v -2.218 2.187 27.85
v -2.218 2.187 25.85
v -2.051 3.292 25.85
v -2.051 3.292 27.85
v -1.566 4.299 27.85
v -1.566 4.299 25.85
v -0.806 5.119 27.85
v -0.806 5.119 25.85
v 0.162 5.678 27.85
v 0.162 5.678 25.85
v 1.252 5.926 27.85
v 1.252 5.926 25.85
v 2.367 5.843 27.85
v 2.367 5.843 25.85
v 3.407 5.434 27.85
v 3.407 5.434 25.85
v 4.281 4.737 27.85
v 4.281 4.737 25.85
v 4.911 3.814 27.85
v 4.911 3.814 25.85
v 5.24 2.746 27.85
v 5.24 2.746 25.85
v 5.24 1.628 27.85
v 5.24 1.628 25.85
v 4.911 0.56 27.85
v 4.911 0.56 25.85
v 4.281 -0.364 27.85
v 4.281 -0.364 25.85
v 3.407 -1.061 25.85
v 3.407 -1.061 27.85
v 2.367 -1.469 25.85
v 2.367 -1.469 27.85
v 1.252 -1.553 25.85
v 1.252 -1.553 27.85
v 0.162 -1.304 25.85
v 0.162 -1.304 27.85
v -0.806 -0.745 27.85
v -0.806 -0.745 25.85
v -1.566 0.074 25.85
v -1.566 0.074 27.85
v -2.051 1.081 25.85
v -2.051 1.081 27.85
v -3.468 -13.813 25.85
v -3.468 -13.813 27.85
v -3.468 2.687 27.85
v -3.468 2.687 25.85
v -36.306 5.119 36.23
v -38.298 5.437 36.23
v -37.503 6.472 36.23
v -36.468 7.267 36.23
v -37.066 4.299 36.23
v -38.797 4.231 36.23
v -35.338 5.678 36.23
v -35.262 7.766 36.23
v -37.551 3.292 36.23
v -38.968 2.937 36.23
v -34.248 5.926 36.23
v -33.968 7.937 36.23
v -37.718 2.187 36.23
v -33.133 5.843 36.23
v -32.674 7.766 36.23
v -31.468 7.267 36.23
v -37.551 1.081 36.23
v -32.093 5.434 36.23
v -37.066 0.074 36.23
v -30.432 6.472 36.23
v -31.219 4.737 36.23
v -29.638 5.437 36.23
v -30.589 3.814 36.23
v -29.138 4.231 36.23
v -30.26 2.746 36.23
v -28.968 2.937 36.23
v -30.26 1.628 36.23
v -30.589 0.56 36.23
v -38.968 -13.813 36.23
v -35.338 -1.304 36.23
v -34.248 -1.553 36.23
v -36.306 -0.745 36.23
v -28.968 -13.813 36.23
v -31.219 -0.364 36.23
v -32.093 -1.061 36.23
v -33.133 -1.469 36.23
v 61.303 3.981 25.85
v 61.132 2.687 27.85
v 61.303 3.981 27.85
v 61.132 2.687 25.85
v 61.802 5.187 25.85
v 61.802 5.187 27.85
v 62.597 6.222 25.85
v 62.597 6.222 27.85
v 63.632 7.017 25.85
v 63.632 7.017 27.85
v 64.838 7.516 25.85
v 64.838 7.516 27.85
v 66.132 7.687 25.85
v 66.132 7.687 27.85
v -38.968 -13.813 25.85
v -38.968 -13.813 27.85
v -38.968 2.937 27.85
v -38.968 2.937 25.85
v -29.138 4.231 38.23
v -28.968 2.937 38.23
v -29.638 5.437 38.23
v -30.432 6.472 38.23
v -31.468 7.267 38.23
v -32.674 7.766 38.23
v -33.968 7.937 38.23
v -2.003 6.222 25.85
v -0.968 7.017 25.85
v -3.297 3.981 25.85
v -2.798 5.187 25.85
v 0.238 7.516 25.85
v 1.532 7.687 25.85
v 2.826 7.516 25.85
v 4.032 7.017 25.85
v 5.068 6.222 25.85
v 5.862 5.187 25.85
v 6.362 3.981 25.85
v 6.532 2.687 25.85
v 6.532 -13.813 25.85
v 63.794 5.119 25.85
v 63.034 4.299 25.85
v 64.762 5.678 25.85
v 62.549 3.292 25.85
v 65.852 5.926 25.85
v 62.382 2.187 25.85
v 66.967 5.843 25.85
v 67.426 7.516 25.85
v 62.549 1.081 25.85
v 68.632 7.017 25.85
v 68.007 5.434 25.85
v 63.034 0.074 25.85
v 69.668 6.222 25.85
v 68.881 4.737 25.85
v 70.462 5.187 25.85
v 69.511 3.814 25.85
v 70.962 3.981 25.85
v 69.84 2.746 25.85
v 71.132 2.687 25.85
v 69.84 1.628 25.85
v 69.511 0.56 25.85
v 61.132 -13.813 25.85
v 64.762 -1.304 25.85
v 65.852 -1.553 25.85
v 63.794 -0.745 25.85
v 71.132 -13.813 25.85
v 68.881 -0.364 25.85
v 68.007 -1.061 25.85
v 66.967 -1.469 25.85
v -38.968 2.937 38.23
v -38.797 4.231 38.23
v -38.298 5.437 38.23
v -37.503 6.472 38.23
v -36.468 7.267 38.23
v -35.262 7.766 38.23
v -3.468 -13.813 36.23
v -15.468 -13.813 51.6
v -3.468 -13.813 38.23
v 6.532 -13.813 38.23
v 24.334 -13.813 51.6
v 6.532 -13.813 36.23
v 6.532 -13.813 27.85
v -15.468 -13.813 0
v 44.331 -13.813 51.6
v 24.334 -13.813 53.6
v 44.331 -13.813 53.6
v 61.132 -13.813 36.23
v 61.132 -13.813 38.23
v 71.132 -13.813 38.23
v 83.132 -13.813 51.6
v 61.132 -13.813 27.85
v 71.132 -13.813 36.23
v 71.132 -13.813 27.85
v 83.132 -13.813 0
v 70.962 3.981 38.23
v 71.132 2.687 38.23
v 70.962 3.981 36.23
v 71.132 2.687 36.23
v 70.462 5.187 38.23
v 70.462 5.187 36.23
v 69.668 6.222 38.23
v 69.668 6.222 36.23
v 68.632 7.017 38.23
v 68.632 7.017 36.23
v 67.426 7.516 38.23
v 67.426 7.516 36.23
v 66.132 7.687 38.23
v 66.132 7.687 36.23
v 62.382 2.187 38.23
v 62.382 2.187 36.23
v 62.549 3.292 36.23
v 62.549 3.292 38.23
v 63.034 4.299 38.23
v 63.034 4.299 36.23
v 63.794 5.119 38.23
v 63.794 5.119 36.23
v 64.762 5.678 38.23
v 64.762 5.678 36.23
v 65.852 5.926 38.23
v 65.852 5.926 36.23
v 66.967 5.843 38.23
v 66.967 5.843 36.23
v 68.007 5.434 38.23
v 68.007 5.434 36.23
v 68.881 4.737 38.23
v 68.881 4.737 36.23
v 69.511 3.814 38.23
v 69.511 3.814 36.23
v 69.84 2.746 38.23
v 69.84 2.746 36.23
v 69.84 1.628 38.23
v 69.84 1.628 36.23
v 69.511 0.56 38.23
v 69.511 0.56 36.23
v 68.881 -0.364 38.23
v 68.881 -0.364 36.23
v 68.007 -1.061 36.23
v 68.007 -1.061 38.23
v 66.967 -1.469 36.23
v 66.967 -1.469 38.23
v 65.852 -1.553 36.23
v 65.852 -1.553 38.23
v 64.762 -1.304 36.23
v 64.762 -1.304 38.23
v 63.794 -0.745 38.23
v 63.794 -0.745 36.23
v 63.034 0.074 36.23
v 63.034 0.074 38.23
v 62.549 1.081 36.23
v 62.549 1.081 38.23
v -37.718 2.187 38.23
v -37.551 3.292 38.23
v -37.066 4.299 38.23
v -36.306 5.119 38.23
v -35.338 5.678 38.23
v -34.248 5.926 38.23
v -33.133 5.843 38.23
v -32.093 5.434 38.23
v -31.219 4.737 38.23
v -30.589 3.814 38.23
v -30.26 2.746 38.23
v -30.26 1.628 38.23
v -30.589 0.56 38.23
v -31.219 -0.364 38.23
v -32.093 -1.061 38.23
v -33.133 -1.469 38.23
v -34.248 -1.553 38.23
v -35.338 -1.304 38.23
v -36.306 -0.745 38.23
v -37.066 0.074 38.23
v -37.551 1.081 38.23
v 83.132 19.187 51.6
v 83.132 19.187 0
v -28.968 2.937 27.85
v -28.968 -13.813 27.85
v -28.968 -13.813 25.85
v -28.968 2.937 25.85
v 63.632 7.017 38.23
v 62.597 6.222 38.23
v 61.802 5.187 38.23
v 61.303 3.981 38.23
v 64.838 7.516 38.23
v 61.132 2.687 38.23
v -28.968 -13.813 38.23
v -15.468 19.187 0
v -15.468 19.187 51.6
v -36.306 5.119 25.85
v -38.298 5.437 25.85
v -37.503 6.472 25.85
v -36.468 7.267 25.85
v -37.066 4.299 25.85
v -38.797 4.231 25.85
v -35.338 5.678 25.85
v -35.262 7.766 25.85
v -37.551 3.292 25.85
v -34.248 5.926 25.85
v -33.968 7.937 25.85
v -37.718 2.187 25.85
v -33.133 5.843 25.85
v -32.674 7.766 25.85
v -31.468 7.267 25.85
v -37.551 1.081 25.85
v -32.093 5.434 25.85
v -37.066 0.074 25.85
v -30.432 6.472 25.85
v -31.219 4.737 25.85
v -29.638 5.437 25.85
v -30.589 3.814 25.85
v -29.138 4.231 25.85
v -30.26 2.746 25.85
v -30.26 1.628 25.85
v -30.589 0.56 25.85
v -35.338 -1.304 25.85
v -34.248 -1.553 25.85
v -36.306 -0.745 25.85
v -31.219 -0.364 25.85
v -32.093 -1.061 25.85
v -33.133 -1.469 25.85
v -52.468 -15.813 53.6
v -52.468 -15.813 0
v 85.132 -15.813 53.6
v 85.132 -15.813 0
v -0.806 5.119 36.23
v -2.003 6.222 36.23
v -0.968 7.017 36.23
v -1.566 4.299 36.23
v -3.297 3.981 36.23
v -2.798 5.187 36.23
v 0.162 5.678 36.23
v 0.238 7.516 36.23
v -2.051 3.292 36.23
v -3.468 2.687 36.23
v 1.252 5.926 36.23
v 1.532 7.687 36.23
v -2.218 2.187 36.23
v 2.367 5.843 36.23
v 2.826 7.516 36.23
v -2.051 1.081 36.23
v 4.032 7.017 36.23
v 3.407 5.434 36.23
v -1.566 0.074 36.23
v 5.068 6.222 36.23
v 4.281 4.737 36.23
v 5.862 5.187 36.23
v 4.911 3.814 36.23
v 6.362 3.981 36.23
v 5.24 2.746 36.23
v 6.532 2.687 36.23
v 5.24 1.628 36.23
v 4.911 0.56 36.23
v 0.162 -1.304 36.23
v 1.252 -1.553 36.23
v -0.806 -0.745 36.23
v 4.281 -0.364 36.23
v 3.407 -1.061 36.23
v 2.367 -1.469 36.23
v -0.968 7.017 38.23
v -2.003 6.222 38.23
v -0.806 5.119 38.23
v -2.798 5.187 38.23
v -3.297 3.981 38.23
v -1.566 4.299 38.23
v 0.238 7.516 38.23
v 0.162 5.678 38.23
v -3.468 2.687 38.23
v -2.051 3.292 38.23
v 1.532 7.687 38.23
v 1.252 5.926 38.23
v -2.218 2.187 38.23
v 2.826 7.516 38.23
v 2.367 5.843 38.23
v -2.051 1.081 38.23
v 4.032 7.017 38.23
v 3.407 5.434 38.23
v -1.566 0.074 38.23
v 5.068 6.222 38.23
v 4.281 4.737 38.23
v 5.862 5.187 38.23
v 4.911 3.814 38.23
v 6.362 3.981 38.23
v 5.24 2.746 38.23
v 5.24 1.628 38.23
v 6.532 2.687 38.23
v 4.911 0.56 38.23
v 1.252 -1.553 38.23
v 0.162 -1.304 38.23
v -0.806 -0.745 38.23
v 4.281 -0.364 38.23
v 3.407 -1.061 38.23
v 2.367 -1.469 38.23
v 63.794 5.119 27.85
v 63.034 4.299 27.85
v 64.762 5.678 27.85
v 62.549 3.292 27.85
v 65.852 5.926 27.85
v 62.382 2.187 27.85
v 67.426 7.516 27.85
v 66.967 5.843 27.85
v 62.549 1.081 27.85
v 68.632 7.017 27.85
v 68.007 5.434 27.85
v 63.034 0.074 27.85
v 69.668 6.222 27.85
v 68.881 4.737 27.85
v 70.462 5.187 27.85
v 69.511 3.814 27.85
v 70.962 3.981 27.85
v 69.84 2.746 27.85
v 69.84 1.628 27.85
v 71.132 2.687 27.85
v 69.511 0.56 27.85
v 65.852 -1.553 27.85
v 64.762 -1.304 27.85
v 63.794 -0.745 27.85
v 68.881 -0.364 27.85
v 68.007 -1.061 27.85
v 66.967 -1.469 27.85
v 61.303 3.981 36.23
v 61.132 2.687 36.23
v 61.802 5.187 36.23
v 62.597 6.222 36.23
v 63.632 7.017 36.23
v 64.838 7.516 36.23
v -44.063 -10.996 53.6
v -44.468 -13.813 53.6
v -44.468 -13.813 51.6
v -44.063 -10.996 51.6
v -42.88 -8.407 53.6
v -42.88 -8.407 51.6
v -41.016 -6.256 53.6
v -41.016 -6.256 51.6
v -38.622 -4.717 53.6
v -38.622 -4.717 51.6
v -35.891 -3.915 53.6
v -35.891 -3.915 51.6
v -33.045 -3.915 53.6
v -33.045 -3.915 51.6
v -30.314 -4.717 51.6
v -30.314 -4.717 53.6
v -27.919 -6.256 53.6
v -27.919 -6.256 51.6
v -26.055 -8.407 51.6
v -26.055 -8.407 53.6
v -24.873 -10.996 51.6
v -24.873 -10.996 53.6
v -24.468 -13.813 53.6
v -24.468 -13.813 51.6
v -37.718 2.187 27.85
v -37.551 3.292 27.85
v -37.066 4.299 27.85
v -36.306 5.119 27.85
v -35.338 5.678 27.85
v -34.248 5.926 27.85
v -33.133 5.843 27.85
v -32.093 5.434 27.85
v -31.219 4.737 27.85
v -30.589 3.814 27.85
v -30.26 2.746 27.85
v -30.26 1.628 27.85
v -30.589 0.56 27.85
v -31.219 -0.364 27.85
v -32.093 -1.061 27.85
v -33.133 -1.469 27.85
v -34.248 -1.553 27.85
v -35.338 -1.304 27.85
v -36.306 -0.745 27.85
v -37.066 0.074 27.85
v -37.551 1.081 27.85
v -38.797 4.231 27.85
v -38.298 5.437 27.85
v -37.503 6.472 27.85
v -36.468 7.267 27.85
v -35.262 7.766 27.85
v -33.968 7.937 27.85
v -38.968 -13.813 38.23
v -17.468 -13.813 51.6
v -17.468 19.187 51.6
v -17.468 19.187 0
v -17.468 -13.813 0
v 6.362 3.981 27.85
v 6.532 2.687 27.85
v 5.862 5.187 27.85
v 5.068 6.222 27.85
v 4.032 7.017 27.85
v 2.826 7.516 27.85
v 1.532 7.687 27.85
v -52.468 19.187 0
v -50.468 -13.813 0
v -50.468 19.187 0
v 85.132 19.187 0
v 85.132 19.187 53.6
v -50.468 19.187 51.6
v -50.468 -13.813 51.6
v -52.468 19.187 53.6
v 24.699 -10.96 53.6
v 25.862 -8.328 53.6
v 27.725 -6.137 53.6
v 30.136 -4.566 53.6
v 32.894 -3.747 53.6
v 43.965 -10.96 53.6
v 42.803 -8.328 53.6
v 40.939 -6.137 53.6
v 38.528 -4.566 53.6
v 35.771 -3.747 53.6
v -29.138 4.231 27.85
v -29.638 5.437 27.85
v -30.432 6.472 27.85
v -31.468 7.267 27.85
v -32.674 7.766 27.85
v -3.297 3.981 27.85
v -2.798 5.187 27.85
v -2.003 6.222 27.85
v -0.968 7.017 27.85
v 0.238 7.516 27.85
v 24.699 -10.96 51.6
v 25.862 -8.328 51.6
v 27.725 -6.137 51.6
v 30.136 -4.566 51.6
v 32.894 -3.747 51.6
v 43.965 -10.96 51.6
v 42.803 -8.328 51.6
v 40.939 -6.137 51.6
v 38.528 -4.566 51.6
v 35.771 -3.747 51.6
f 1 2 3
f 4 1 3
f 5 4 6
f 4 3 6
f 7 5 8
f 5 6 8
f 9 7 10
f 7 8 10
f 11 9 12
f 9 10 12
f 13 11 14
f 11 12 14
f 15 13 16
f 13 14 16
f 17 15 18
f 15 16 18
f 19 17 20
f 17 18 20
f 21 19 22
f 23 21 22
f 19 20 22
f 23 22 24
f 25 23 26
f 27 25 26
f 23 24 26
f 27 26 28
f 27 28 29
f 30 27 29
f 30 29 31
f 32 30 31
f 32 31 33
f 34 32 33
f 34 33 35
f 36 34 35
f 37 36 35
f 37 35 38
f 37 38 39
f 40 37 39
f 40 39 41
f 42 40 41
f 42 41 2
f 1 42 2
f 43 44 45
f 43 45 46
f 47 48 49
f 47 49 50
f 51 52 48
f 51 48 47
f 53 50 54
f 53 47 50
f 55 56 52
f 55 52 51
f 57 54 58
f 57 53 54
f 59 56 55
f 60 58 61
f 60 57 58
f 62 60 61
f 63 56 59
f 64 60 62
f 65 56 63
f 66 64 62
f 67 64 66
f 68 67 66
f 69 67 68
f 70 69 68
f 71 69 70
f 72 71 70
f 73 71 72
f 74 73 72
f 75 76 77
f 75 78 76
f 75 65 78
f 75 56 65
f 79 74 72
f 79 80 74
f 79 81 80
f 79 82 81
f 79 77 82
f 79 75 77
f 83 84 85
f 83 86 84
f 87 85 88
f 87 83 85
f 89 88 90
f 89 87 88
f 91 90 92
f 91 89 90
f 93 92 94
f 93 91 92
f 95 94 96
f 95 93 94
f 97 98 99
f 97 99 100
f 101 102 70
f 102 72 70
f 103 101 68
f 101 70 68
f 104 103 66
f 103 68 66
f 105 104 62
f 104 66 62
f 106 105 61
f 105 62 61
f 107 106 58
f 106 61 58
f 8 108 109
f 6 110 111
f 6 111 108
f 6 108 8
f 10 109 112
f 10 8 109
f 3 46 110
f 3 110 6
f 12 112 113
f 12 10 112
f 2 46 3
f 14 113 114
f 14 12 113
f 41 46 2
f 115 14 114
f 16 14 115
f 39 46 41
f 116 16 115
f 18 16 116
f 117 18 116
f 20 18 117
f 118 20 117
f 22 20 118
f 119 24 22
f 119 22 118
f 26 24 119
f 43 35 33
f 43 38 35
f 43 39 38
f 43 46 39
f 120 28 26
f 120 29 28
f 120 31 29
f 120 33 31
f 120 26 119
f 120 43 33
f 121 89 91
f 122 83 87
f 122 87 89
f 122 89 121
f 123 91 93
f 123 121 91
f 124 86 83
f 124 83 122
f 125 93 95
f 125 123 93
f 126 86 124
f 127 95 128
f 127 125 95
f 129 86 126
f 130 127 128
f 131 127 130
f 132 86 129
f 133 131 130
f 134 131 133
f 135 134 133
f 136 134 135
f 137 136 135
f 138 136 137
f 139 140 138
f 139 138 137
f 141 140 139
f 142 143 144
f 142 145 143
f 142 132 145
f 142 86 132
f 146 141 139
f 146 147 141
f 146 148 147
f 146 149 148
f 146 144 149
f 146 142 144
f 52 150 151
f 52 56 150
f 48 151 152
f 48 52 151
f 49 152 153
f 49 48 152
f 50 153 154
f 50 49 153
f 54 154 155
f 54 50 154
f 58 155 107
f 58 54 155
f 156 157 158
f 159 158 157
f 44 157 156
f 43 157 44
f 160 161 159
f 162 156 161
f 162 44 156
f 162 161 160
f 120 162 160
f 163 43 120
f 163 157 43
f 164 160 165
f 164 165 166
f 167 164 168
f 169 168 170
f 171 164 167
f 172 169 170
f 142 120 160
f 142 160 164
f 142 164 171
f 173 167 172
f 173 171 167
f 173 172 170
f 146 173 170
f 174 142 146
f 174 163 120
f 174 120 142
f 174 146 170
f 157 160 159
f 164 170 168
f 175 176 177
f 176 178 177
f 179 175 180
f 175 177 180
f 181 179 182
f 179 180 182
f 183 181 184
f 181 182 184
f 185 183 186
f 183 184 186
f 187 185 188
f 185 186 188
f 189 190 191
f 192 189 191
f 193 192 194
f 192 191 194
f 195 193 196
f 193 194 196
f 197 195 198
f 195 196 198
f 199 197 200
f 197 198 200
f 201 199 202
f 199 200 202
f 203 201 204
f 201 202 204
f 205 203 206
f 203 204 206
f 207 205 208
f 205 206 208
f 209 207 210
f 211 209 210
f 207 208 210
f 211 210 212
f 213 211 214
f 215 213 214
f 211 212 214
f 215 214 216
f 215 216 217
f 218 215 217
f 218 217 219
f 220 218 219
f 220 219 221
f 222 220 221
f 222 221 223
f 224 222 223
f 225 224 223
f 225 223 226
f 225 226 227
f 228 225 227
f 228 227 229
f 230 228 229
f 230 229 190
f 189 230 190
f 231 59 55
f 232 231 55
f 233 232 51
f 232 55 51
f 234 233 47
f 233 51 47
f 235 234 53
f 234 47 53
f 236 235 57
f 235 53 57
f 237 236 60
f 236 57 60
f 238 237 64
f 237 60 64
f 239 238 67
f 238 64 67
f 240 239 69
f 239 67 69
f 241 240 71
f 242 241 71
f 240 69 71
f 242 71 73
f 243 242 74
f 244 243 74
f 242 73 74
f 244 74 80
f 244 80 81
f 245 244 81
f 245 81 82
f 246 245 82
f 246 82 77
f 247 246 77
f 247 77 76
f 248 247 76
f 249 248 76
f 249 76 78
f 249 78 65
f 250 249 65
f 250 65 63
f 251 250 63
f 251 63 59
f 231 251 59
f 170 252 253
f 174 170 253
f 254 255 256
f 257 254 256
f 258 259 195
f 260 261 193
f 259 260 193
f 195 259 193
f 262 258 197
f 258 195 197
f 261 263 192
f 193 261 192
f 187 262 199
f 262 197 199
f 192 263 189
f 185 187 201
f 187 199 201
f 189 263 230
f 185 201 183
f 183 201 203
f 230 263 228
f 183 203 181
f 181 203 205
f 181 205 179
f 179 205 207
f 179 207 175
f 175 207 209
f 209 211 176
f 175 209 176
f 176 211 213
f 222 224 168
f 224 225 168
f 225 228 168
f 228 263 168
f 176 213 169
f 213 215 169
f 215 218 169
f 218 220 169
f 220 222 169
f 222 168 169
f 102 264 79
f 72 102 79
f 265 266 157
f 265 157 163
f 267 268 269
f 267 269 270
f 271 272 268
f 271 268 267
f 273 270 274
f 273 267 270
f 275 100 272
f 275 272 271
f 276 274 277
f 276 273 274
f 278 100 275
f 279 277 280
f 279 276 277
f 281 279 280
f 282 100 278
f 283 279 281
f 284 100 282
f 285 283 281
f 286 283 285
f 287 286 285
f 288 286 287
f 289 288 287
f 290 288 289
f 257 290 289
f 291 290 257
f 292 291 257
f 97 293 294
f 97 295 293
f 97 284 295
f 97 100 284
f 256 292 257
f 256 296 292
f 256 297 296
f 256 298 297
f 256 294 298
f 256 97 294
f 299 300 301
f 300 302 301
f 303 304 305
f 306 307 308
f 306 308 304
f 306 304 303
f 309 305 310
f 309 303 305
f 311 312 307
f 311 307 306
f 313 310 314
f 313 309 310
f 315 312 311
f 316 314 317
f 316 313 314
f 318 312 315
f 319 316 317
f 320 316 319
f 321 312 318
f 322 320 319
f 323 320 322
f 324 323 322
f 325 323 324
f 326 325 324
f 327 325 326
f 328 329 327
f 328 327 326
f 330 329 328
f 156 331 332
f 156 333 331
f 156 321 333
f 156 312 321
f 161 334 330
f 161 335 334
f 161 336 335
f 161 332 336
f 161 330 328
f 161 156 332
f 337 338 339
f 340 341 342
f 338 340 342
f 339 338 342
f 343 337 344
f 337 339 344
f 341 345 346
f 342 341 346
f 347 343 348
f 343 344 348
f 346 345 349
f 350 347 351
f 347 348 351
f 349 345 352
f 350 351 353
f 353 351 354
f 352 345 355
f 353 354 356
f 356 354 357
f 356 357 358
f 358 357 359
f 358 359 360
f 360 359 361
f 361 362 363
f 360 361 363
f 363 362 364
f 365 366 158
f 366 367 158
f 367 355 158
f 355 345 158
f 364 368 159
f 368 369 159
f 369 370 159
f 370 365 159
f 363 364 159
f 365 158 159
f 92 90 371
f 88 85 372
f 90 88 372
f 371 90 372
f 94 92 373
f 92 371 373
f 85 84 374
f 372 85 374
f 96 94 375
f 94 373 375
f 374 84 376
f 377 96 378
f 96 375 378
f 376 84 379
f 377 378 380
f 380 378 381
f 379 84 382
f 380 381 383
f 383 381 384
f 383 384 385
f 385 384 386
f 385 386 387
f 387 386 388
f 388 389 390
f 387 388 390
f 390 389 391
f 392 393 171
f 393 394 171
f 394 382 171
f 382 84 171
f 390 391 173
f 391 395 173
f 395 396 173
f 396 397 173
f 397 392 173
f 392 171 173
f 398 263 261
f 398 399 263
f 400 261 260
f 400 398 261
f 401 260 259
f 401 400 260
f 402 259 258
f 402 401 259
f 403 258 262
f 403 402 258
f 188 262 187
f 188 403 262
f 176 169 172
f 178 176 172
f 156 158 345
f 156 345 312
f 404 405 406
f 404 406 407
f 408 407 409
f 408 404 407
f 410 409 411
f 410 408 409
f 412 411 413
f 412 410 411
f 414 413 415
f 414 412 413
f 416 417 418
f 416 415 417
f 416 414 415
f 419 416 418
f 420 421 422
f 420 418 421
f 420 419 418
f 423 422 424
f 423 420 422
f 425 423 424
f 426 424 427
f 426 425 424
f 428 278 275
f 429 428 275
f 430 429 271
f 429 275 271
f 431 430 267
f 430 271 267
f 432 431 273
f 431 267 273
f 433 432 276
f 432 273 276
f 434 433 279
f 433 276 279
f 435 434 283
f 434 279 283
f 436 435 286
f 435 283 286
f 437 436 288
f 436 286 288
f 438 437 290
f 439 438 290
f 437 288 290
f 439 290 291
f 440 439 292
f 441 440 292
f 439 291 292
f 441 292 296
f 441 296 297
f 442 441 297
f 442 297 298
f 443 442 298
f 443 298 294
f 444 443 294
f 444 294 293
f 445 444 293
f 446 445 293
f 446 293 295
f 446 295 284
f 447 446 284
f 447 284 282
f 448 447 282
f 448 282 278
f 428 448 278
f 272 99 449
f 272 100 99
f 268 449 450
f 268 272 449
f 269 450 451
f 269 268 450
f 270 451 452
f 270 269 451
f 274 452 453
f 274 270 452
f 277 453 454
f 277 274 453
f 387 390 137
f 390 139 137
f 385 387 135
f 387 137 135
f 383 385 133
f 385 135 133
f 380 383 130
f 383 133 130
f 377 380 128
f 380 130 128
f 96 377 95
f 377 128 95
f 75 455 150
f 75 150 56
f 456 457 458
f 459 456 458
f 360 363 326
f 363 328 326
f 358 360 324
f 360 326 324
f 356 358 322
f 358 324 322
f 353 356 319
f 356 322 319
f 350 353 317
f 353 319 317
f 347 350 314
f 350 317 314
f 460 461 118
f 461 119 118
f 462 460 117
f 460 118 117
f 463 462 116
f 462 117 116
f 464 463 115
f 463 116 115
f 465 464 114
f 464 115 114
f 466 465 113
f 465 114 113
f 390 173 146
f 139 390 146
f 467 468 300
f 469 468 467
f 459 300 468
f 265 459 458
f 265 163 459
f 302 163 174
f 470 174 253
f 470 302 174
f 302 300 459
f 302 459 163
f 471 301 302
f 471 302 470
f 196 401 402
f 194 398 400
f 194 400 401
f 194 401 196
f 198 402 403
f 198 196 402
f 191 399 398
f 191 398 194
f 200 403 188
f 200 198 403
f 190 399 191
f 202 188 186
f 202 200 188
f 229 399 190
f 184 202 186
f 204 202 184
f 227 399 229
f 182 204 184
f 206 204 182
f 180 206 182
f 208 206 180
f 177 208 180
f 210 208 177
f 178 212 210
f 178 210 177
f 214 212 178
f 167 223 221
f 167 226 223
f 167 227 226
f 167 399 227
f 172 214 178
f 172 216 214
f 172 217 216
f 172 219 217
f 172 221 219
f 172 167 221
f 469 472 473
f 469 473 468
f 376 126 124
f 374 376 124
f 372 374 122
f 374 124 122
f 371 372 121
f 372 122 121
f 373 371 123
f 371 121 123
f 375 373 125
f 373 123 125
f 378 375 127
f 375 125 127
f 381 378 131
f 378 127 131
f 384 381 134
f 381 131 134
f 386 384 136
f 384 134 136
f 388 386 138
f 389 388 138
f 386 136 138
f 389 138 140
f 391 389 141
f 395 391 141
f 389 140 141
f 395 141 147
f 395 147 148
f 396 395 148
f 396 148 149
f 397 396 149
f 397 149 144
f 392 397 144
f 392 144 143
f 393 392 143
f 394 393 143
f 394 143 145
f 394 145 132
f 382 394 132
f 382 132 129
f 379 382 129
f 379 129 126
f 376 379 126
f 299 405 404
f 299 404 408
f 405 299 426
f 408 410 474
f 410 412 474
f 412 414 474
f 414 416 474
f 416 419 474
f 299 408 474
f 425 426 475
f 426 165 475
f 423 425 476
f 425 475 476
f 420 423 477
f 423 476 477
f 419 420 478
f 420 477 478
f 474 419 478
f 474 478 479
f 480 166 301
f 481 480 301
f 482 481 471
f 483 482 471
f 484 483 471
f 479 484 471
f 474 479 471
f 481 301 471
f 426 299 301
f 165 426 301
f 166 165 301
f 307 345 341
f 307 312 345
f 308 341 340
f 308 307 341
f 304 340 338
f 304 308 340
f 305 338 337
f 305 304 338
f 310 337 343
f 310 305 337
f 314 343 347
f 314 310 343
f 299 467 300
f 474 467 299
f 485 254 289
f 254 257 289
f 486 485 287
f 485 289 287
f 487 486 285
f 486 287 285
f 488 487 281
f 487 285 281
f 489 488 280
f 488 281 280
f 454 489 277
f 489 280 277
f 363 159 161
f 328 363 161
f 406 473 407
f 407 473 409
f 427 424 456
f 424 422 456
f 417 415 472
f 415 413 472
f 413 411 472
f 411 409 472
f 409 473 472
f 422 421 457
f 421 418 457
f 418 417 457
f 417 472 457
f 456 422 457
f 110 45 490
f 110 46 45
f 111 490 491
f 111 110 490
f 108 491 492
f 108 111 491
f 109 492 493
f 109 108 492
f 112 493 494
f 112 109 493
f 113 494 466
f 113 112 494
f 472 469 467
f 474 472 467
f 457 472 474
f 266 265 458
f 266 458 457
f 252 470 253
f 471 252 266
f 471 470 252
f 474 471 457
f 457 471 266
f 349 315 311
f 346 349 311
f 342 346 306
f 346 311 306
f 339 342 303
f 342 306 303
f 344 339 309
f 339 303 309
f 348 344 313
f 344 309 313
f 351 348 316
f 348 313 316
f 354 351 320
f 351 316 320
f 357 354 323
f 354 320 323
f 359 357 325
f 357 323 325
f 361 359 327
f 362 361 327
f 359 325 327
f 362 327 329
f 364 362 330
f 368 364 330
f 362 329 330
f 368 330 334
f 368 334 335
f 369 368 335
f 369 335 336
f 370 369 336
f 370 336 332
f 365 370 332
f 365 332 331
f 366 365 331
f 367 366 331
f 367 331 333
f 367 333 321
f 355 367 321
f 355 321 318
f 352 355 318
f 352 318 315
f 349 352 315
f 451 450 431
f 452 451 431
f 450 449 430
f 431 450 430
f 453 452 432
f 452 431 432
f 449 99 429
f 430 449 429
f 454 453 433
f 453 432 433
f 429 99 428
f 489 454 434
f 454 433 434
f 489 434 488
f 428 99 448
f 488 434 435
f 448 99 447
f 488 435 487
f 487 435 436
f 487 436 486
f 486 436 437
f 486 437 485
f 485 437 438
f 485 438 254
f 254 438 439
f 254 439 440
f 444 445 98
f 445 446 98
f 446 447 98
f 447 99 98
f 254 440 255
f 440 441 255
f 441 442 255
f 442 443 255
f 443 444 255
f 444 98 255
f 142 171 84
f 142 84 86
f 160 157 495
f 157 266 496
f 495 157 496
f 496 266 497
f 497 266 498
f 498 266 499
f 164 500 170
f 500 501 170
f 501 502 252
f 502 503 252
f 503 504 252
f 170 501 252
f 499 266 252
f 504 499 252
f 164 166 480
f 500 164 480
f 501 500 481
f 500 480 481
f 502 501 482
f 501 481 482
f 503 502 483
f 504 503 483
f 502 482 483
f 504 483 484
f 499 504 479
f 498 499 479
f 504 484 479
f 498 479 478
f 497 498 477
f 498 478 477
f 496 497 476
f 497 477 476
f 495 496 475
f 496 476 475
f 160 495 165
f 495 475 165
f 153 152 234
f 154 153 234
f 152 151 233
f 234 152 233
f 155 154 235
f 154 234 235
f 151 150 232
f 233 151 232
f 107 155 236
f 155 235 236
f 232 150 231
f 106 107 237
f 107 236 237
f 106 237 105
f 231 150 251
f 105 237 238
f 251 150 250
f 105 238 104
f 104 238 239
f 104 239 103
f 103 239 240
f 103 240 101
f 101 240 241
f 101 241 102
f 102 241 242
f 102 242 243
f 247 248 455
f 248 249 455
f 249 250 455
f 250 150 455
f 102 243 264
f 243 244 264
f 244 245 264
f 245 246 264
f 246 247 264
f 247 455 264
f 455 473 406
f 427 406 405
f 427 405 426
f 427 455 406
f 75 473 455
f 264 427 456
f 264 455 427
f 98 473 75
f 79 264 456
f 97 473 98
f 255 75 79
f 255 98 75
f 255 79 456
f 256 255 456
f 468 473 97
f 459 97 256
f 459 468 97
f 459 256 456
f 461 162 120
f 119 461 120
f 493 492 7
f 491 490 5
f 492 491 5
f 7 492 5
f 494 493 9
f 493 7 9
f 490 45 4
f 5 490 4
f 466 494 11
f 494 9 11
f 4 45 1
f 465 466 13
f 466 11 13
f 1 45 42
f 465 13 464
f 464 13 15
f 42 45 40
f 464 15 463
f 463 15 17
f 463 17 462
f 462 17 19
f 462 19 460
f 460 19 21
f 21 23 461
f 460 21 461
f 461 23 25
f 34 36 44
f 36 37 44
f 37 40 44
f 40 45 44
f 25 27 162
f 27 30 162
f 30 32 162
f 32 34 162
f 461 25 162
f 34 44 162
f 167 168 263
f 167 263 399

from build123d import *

# Parameters (mm, degrees)
BOSS_EXTRU_1_DEPTH      = 53.6
BOSS_EXTRU_1_DEPTH_BACK = 0.0001
ESQUISSE1_W             = 102.6
ESQUISSE1_H             = 35
ESQUISSE4_W             = 98.6
ESQUISSE4_H             = 51.6
ENL_V_MAT_EXTRU_2_DEPTH = 33
ESQUISSE9_W             = 10
ESQUISSE9_H             = 2
BOSS_EXTRU_3_DEPTH      = 21.5
CONG_2_R                = 5
ESQUISSE10_R            = 3.75
ENL_V_MAT_EXTRU_4_DEPTH = 15
ESQUISSE16_W            = 53.6001
ESQUISSE16_H            = 35
BOSS_EXTRU_5_DEPTH      = 35
ENL_V_MAT_EXTRU_5_DEPTH = 2.1
ESQUISSE19_W            = 33
ESQUISSE19_H            = 51.6001
ENL_V_MAT_EXTRU_6_DEPTH = 33
ENL_V_MAT_EXTRU_7_DEPTH = 2.5
ESQUISSE21_W            = 10
ESQUISSE21_H            = 2
BOSS_EXTRU_6_DEPTH      = 21.75
CONG_3_R                = 5
ESQUISSE22_R            = 3.75
ENL_V_MAT_EXTRU_8_DEPTH = 15


with BuildPart() as part:
    # Esquisse1 → Boss.-Extru.1 (new, two sides: drawn at the far end of the back side and taken through both)
    with BuildSketch(Plane.XY.offset(-BOSS_EXTRU_1_DEPTH_BACK)):
        with Locations((33.832170394, 1.686746988)):
            Rectangle(ESQUISSE1_W, ESQUISSE1_H)
    extrude(amount=BOSS_EXTRU_1_DEPTH + BOSS_EXTRU_1_DEPTH_BACK)

    # Esquisse4 → Enlèv. mat.-Extru.2 (cut)
    with BuildSketch(Plane(origin=(0, 19.186746988, 0), x_dir=(1, 0, 0), z_dir=(0, 1, 0))):
        with Locations((33.832170394, -25.7999)):
            Rectangle(ESQUISSE4_W, ESQUISSE4_H)
    extrude(amount=-ENL_V_MAT_EXTRU_2_DEPTH, mode=Mode.SUBTRACT)

    # Esquisse9 → Boss.-Extru.3 (add)
    with BuildSketch(Plane(origin=(0, -13.813253012, 0), x_dir=(1, 0, 0), z_dir=(0, 1, 0))):
        with Locations((1.532170394, -26.8499)):
            Rectangle(ESQUISSE9_W, ESQUISSE9_H)
        with Locations((1.532170394, -37.2299)):
            Rectangle(ESQUISSE9_W, ESQUISSE9_H)
        with Locations((66.132170394, -26.8499)):
            Rectangle(ESQUISSE9_W, ESQUISSE9_H)
        with Locations((66.132170394, -37.2299)):
            Rectangle(ESQUISSE9_W, ESQUISSE9_H)
    extrude(amount=BOSS_EXTRU_3_DEPTH)

    # Congé2
    cong_2_edges = [part.edges().sort_by_distance(p)[0] for p in [
        (71.132170394, 7.686746988, 37.2299),
        (61.132170394, 7.686746988, 37.2299),
        (71.132170394, 7.686746988, 26.8499),
        (61.132170394, 7.686746988, 26.8499),
        (-3.467829606, 7.686746988, 37.2299),
        (6.532170394, 7.686746988, 37.2299),
        (-3.467829606, 7.686746988, 26.8499),
        (6.532170394, 7.686746988, 26.8499),
    ]]
    fillet(cong_2_edges, radius=CONG_2_R - 0.0001)  # a hair under: the kernel refuses the full size

    # Esquisse10 → Enlèv. mat.-Extru.4 (cut)
    with BuildSketch(Plane(origin=(0, 0, 25.8499), x_dir=(-1, 0, 0), z_dir=(0, 0, -1))):
        with Locations((-66.132170394, 2.186746988)):
            Circle(ESQUISSE10_R)
        with Locations((-1.532170394, 2.186746988)):
            Circle(ESQUISSE10_R)
    extrude(amount=-ENL_V_MAT_EXTRU_4_DEPTH, mode=Mode.SUBTRACT)

    # Esquisse16 → Boss.-Extru.5 (add)
    with BuildSketch(Plane.ZY.offset(17.467829606)):
        with Locations((26.79995, 1.686746988)):
            Rectangle(ESQUISSE16_W, ESQUISSE16_H)
    extrude(amount=BOSS_EXTRU_5_DEPTH)

    # Esquisse18 → Enlèv. mat.-Extru.5 (cut)
    with BuildSketch(Plane.XY.offset(53.6)):
        with BuildLine():
            Line((24.333519225, -13.813253012), (44.330821563, -13.813253012))
            ThreePointArc((44.330821563, -13.813253012), (34.332170394, -3.643205178), (24.333519225, -13.813253012))
        make_face()
    extrude(amount=-ENL_V_MAT_EXTRU_5_DEPTH, mode=Mode.SUBTRACT)

    # Esquisse19 → Enlèv. mat.-Extru.6 (cut)
    with BuildSketch(Plane(origin=(0, 19.186746988, 0), x_dir=(1, 0, 0), z_dir=(0, 1, 0))):
        with Locations((-33.967829606, -25.79995)):
            Rectangle(ESQUISSE19_W, ESQUISSE19_H)
    extrude(amount=-ENL_V_MAT_EXTRU_6_DEPTH, mode=Mode.SUBTRACT)

    # Esquisse20 → Enlèv. mat.-Extru.7 (cut)
    with BuildSketch(Plane.XY.offset(53.6)):
        with BuildLine():
            Line((-24.467829606, -13.813253012), (-44.467829606, -13.813253012))
            ThreePointArc((-44.467829606, -13.813253012), (-34.467829606, -3.813253012), (-24.467829606, -13.813253012))
        make_face()
    extrude(amount=-ENL_V_MAT_EXTRU_7_DEPTH, mode=Mode.SUBTRACT)

    # Esquisse21 → Boss.-Extru.6 (add)
    with BuildSketch(Plane(origin=(0, -13.813253012, 0), x_dir=(1, 0, 0), z_dir=(0, 1, 0))):
        with Locations((-33.967829606, -26.8499)):
            Rectangle(ESQUISSE21_W, ESQUISSE21_H)
        with Locations((-33.967829606, -37.2299)):
            Rectangle(ESQUISSE21_W, ESQUISSE21_H)
    extrude(amount=BOSS_EXTRU_6_DEPTH)

    # Congé3
    cong_3_edges = [part.edges().sort_by_distance(p)[0] for p in [
        (-28.967829606, 7.936746988, 37.2299),
        (-38.967829606, 7.936746988, 37.2299),
        (-38.967829606, 7.936746988, 26.8499),
        (-28.967829606, 7.936746988, 26.8499),
    ]]
    fillet(cong_3_edges, radius=CONG_3_R - 0.0001)  # a hair under: the kernel refuses the full size

    # Esquisse22 → Enlèv. mat.-Extru.8 (cut)
    with BuildSketch(Plane(origin=(0, 0, 25.8499), x_dir=(-1, 0, 0), z_dir=(0, 0, -1))):
        with Locations((33.967829606, 2.186746988)):
            Circle(ESQUISSE22_R)
    extrude(amount=-ENL_V_MAT_EXTRU_8_DEPTH, mode=Mode.SUBTRACT)


solid = part.part
